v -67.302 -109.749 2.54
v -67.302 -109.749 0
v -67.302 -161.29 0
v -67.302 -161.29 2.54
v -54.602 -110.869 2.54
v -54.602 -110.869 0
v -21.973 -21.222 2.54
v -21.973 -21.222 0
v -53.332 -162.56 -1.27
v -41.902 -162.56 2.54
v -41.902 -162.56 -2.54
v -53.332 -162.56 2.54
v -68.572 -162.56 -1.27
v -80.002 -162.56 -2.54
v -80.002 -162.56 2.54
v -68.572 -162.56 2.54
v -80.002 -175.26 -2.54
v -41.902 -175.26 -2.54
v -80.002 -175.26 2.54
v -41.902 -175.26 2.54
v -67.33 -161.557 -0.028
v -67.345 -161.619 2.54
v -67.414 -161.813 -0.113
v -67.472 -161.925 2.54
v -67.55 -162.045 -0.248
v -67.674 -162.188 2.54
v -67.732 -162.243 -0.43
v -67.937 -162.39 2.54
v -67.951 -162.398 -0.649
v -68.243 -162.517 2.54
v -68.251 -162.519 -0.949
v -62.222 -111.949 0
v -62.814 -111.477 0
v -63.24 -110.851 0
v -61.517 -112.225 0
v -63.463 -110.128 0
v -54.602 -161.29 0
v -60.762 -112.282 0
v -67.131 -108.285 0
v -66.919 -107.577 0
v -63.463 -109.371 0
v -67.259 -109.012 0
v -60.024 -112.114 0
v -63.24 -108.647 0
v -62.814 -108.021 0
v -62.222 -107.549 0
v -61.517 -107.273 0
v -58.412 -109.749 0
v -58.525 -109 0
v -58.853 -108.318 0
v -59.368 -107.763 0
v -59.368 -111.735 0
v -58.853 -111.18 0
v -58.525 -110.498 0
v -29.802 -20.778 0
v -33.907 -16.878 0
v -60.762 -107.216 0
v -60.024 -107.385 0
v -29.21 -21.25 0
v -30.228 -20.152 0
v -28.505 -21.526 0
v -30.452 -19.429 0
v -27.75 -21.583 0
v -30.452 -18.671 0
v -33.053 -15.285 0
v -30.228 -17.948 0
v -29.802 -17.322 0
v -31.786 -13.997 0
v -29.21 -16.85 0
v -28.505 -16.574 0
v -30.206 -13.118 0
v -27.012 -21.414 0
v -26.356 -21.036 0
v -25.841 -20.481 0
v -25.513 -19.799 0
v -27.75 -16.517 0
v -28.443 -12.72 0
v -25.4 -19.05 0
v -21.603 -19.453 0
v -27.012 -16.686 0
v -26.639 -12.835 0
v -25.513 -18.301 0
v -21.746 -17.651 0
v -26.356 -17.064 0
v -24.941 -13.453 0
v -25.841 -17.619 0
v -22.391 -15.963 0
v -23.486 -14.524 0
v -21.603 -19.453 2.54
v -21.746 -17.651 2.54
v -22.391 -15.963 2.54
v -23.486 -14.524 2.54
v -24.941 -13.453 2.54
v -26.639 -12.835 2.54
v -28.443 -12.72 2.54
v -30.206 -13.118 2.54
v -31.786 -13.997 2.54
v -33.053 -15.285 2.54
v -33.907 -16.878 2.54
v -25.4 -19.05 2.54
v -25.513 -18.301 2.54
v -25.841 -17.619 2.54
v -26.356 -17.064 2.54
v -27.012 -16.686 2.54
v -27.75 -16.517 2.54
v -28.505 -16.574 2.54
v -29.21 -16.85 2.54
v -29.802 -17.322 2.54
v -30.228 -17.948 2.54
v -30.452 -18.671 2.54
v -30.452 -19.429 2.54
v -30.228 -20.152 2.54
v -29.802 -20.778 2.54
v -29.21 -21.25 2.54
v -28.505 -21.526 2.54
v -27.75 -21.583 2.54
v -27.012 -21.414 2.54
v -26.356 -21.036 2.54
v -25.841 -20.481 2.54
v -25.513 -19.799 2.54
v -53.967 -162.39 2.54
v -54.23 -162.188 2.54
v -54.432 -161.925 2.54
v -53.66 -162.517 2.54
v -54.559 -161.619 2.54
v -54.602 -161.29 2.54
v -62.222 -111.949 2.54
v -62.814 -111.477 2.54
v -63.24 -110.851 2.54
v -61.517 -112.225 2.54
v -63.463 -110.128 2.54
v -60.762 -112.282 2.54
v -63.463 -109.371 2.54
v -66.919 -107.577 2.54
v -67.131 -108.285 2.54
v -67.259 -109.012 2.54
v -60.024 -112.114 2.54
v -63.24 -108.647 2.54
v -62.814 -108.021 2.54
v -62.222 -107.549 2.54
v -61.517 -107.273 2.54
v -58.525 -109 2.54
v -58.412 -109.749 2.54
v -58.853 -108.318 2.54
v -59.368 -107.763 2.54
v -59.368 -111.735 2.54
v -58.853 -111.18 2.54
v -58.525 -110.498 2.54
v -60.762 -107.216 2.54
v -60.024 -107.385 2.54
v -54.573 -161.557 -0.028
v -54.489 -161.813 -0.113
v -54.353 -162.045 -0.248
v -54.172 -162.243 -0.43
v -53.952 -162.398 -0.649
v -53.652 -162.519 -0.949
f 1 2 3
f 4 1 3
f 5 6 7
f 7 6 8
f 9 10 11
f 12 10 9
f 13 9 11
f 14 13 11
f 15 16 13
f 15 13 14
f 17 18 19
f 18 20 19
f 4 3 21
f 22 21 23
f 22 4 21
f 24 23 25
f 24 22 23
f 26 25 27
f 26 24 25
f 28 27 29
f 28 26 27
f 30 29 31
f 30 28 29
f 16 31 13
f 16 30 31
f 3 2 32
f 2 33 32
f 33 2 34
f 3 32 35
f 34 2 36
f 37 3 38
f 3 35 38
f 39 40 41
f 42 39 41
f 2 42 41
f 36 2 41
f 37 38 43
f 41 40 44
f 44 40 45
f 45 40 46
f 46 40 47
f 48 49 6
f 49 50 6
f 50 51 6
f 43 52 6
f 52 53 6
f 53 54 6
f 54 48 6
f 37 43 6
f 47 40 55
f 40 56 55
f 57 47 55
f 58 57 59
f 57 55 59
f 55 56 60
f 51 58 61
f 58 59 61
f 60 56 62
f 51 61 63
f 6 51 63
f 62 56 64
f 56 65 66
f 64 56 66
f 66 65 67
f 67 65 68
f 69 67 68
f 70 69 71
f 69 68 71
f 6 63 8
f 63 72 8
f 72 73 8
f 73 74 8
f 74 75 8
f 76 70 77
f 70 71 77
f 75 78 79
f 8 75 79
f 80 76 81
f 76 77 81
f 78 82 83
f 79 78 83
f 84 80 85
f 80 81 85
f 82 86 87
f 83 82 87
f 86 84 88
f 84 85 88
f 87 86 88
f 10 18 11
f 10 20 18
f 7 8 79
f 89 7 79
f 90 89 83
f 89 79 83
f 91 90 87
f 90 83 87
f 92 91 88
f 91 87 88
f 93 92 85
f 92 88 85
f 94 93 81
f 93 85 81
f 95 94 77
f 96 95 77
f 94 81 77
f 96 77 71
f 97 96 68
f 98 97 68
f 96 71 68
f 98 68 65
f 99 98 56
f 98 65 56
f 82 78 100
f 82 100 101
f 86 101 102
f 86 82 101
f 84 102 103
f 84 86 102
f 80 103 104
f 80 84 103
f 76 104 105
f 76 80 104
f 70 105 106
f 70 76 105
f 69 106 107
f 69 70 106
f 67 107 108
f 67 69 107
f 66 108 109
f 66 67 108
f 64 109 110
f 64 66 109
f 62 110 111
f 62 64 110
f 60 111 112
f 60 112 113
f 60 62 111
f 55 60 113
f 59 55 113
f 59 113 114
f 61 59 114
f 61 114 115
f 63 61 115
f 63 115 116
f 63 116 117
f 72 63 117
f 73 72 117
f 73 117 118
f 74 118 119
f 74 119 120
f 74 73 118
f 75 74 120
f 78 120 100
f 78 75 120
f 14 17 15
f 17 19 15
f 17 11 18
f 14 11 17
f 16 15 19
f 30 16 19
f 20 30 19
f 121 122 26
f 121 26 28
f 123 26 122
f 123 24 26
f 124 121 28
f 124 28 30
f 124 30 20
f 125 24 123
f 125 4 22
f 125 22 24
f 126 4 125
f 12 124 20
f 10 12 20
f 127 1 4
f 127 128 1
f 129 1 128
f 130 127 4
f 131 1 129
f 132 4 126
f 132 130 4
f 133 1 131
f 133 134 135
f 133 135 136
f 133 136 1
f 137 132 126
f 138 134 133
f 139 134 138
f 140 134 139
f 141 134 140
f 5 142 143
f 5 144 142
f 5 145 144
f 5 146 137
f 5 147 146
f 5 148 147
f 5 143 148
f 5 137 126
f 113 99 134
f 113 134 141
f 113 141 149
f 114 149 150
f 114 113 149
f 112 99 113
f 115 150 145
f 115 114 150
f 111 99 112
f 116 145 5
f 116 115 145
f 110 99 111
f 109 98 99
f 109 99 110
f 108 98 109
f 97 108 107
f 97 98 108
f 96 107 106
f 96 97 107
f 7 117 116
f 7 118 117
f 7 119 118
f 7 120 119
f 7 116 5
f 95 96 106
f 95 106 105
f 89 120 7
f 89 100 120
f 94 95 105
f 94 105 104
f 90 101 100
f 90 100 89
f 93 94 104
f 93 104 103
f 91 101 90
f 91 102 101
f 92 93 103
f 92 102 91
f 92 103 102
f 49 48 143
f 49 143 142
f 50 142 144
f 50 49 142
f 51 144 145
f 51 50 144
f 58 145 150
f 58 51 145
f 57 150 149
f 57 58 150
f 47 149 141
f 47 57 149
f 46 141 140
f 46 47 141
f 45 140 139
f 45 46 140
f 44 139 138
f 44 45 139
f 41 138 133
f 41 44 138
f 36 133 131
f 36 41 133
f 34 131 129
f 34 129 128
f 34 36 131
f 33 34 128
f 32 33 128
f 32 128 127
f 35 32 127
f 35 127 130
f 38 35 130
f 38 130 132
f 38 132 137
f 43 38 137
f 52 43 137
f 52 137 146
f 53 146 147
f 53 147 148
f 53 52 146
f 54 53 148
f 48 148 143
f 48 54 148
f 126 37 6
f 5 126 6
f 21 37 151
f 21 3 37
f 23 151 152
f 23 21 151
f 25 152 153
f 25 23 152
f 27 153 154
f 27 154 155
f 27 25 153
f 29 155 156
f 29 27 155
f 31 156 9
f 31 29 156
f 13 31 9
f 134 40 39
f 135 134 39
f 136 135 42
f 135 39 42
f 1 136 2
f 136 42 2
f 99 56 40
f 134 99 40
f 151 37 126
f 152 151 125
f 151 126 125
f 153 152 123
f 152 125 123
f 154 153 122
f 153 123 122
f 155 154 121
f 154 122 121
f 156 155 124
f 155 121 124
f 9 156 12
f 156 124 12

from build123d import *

# Parameters (mm, degrees)
SKETCH1_R           = 2.54
BOSS_EXTRUDE1_DEPTH = 2.54
SKETCH2_W           = 38.1
SKETCH2_H           = 12.7
BOSS_EXTRUDE2_DEPTH = 2.54
FILLET1_R           = 1.27


with BuildPart() as part:
    # Sketch1 → Boss-Extrude1 (new body)
    with BuildSketch(Plane.XY):
        with BuildLine():
            Line((-54.601784234, -110.868808086), (-21.972951858, -21.22182791))
            ThreePointArc((-21.972951858, -21.22182791), (-25.76817209, -13.082951858), (-33.907048142, -16.87817209))
            Line((-33.907048142, -16.87817209), (-66.918832376, -107.577303848))
            ThreePointArc((-66.918832376, -107.577303848), (-67.205313465, -108.64646583), (-67.301784234, -109.749131758))
            Line((-67.301784234, -109.749131758), (-67.301784234, -162.56))
            Line((-67.301784234, -162.56), (-80.001784234, -162.56))
            Line((-80.001784234, -162.56), (-80.001784234, -175.26))
            Line((-80.001784234, -175.26), (-41.901784234, -175.26))
            Line((-41.901784234, -175.26), (-41.901784234, -162.56))
            Line((-41.901784234, -162.56), (-54.601784234, -162.56))
            Line((-54.601784234, -162.56), (-54.601784234, -110.868808086))
        make_face()
        with Locations((-27.94, -19.05)):
            Circle(SKETCH1_R, mode=Mode.SUBTRACT)
        with Locations((-60.951784234, -109.749131758)):
            Circle(SKETCH1_R, mode=Mode.SUBTRACT)
    extrude(amount=BOSS_EXTRUDE1_DEPTH)

    # Sketch2 → Boss-Extrude2 (add)
    with BuildSketch(Plane(origin=(0, 0, 0), x_dir=(-1, 0, 0), z_dir=(0, 0, -1))):
        with Locations((60.951784234, -168.91)):
            Rectangle(SKETCH2_W, SKETCH2_H)
    extrude(amount=BOSS_EXTRUDE2_DEPTH)

    # Fillet1
    fillet1_edges = [part.edges().sort_by_distance(p)[0] for p in [
        (-54.601784234, -162.56, 1.27),
        (-67.301784234, -162.56, 1.27),
        (-60.951784234, -162.56, 0),
    ]]
    fillet(fillet1_edges, radius=FILLET1_R)


solid = part.part
